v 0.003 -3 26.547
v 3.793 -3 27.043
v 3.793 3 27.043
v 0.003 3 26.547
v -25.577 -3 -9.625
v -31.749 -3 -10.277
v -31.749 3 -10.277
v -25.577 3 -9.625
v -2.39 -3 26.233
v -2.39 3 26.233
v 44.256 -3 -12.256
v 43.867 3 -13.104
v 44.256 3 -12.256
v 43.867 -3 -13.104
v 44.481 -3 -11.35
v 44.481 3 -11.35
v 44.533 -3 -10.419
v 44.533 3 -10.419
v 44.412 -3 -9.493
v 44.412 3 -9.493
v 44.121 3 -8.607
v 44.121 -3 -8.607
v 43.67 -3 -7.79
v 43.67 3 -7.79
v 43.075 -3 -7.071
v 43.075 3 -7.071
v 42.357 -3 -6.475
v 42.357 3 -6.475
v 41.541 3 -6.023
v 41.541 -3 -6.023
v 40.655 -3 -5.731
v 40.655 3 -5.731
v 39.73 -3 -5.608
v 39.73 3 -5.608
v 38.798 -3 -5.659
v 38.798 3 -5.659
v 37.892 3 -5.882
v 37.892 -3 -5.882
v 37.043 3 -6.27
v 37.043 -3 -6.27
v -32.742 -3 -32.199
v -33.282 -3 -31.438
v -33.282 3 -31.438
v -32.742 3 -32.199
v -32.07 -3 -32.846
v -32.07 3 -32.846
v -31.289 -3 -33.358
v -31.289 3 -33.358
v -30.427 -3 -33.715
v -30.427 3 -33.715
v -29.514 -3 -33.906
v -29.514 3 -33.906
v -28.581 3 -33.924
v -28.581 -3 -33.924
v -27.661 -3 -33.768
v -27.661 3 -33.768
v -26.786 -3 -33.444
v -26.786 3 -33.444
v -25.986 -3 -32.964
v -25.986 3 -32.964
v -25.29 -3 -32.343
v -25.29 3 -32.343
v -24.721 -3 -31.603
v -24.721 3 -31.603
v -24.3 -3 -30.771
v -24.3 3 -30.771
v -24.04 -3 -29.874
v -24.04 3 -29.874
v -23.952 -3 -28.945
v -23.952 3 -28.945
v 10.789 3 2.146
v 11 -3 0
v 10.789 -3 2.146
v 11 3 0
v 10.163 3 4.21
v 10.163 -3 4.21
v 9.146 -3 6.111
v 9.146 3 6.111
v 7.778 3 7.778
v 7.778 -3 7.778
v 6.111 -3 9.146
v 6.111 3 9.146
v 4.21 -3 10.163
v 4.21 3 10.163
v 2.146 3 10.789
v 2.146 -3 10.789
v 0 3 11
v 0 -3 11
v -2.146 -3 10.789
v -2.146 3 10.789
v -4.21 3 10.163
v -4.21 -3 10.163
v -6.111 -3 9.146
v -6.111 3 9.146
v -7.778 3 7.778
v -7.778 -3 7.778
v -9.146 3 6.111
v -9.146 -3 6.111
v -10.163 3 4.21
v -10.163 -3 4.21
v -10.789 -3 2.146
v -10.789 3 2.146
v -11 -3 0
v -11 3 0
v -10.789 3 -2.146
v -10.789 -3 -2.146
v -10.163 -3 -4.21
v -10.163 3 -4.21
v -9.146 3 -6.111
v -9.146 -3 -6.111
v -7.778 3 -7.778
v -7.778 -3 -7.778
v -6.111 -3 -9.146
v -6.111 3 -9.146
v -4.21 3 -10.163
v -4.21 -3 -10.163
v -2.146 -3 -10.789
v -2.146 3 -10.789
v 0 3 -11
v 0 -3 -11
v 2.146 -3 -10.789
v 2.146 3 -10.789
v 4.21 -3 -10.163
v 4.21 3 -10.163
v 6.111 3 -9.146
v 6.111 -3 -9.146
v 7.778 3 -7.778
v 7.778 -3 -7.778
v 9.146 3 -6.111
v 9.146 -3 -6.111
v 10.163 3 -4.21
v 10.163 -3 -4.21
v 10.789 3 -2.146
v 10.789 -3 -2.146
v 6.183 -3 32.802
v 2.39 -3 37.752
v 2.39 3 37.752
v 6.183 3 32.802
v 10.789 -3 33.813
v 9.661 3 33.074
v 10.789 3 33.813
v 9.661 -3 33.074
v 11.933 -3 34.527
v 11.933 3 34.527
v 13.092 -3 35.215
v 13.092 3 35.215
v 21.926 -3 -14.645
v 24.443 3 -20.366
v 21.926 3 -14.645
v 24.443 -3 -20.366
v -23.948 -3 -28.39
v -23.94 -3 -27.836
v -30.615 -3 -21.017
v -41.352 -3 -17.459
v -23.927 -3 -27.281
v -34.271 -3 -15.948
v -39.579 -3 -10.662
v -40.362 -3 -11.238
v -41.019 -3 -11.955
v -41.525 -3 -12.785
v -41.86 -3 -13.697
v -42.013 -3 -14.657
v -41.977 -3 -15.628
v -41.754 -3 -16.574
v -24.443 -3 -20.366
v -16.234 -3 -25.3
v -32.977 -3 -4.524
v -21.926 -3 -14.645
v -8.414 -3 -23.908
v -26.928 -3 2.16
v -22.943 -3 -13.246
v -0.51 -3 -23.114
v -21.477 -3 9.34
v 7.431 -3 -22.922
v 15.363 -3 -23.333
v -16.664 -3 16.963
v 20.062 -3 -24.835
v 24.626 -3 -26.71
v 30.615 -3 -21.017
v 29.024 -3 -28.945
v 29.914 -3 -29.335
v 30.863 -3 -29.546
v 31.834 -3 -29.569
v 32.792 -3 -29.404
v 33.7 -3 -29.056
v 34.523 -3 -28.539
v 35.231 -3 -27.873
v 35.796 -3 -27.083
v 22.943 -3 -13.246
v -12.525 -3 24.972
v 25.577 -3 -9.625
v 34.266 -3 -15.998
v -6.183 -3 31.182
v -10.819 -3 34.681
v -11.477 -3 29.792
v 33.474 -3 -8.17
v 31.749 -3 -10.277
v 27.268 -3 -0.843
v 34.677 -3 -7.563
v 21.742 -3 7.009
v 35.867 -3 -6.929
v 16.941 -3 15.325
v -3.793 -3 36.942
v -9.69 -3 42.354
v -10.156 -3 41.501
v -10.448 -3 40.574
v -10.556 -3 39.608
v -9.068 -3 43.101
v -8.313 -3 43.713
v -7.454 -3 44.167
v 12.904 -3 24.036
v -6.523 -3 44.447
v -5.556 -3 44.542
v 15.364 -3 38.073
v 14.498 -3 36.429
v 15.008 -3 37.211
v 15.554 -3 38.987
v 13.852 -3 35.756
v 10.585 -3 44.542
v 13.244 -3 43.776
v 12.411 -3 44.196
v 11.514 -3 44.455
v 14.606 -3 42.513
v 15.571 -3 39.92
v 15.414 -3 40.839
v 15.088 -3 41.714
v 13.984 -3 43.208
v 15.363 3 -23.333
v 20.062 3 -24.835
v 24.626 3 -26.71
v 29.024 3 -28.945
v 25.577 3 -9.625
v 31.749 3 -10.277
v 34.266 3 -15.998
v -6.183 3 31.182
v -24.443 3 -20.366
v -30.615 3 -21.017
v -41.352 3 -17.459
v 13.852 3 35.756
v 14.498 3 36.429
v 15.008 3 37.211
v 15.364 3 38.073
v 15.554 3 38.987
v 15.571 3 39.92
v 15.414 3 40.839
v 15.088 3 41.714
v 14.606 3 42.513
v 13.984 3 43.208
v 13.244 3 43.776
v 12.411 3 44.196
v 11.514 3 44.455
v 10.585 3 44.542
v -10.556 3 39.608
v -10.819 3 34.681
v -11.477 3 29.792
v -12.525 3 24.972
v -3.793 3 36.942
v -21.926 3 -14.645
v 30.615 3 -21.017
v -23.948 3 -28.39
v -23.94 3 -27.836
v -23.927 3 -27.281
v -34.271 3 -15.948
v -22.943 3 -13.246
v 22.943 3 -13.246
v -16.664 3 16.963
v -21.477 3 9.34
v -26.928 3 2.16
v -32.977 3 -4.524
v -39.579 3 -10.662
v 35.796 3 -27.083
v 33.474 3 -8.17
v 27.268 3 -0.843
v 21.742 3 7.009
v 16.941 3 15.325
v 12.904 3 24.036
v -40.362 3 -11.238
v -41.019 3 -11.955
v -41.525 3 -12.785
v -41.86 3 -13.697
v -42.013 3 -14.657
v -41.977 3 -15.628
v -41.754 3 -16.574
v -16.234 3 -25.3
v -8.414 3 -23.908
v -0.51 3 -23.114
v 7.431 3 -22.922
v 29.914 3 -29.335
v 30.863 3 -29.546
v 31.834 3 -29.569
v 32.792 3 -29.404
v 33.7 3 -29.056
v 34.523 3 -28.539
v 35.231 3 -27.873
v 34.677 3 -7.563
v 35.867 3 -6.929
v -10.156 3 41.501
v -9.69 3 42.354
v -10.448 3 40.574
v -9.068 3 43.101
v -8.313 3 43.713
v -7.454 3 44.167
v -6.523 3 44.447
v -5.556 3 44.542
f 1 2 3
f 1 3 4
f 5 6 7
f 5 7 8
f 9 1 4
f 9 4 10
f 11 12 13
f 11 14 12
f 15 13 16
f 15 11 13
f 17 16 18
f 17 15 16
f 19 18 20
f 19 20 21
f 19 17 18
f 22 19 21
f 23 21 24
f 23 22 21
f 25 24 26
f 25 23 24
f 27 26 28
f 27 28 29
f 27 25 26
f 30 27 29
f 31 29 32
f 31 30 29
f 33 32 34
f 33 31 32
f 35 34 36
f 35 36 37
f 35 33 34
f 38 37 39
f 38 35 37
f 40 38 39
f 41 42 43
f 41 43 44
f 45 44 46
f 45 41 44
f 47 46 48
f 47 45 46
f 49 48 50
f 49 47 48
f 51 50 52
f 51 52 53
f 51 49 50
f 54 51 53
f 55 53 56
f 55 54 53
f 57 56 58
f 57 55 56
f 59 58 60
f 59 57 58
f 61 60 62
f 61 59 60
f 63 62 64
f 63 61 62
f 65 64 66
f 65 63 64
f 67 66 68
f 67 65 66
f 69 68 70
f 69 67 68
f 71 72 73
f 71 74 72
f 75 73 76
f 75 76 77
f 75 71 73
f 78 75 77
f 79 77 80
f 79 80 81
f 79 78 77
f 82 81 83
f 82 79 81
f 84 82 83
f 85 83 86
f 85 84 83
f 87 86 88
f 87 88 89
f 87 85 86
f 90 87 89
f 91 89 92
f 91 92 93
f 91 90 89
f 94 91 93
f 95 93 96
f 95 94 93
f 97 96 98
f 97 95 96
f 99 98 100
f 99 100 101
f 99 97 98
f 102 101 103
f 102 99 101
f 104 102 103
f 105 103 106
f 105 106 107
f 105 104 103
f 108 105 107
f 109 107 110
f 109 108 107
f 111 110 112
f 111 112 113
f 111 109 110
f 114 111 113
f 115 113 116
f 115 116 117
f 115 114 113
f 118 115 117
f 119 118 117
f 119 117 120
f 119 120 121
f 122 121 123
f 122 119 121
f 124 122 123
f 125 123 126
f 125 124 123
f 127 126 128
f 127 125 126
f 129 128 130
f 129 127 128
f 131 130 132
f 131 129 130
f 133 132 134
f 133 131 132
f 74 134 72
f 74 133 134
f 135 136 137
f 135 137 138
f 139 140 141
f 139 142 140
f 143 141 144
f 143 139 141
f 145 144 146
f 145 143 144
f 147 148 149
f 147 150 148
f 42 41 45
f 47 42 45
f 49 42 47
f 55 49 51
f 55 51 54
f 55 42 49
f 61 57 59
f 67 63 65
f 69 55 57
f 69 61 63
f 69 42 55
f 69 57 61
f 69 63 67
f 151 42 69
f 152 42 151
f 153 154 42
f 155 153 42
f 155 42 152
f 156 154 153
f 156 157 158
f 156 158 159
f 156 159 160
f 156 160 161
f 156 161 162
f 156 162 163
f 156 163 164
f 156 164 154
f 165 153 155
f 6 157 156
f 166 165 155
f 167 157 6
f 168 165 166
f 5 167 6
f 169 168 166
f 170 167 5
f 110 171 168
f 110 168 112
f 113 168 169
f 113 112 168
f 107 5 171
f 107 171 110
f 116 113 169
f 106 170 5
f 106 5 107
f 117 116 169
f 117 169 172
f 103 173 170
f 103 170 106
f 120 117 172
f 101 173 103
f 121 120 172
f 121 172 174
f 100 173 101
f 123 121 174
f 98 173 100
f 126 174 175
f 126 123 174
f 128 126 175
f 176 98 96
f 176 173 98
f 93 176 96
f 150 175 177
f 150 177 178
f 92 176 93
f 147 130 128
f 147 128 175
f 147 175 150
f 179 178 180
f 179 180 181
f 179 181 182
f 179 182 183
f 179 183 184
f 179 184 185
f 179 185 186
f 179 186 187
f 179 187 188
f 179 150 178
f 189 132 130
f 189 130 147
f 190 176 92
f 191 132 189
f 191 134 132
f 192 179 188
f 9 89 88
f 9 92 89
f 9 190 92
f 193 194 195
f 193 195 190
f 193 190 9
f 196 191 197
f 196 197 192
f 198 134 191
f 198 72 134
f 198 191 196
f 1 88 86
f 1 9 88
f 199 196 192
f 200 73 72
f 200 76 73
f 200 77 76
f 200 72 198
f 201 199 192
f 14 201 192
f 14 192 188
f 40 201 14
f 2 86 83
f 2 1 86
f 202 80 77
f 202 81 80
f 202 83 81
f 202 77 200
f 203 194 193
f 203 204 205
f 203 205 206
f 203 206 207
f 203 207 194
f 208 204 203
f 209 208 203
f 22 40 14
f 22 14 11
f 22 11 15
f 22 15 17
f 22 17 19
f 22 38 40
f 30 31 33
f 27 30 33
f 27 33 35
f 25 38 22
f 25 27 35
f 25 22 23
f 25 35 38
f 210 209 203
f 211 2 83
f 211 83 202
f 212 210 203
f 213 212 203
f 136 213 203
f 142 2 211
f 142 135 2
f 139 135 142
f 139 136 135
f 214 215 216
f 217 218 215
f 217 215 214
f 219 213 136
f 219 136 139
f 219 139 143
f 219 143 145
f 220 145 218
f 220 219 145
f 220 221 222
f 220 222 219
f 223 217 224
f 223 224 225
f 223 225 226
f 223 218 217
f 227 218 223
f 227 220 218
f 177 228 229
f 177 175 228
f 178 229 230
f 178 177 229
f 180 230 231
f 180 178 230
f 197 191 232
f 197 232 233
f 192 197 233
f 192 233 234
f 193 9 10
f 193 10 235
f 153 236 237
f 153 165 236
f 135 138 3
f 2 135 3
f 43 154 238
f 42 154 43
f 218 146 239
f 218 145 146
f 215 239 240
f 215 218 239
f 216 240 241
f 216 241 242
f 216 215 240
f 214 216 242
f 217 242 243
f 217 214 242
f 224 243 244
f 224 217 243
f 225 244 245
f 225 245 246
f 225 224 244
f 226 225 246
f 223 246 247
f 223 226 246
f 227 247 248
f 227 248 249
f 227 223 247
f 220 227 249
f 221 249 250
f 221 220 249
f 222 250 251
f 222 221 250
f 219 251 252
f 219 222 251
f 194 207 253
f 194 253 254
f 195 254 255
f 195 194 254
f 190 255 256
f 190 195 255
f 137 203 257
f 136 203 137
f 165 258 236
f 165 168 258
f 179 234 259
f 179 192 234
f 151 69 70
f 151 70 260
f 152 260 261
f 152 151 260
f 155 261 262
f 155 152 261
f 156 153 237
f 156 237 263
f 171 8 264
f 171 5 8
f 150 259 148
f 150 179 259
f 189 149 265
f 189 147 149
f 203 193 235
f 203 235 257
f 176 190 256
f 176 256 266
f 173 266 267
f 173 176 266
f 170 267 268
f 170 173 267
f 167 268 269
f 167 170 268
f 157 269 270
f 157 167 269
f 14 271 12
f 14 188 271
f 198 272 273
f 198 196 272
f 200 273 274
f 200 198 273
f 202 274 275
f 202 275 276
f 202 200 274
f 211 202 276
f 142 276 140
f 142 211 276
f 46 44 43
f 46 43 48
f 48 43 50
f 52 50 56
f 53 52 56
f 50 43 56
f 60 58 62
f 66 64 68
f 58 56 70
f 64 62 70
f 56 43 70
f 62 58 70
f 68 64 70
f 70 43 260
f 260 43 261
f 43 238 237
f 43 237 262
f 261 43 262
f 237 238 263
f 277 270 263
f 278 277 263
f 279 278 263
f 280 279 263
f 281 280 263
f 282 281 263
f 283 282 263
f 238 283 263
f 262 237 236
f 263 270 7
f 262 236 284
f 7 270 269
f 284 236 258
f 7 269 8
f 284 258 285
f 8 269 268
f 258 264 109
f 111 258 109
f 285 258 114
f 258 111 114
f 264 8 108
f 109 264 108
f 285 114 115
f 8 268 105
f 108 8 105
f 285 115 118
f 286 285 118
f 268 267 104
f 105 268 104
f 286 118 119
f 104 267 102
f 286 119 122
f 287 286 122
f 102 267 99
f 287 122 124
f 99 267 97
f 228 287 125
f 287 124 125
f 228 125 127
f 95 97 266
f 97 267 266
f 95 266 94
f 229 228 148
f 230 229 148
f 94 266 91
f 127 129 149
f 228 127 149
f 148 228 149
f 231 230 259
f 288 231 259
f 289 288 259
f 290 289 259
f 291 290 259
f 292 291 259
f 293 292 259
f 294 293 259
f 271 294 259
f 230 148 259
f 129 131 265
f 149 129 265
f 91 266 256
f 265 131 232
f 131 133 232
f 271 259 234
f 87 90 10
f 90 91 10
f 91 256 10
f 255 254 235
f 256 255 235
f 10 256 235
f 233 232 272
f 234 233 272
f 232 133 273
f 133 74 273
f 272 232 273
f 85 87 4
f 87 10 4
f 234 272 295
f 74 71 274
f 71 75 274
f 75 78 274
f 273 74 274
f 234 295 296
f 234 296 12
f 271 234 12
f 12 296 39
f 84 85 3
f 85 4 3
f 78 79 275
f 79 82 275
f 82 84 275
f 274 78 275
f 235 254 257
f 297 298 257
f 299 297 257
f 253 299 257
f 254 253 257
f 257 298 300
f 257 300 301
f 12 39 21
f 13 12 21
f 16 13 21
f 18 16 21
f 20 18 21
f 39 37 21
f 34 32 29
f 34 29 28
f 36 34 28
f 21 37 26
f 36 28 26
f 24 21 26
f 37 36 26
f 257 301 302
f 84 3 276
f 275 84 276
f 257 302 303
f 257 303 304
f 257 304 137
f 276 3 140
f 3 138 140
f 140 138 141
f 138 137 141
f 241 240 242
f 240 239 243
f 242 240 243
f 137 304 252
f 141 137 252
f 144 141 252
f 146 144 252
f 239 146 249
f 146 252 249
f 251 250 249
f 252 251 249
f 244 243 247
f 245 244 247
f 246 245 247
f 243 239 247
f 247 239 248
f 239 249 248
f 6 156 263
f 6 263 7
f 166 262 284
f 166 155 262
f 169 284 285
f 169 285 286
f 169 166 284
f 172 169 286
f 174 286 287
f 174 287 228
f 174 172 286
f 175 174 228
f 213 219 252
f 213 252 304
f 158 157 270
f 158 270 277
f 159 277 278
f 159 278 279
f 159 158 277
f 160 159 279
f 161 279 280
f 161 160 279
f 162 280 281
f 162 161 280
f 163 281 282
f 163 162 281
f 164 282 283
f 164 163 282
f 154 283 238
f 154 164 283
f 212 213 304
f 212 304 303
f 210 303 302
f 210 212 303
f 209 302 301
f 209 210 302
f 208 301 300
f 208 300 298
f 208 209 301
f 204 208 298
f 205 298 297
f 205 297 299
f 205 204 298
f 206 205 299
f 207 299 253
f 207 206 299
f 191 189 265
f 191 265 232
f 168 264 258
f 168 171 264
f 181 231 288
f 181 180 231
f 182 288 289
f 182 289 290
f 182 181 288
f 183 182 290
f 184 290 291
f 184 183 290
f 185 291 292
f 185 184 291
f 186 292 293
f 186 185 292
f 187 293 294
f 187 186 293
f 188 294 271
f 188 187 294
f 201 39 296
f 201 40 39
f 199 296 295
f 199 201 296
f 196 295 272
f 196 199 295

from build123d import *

# Parameters (mm, degrees)
F0_R     = 11
F1_DEPTH = 3


with BuildPart() as f1:
    # F0 (on Front) → F1 (new body, symmetric)
    with BuildSketch(Plane.XZ):
        with BuildLine():
            ThreePointArc((13.091594, 35.215377), (15.413694, 40.839465), (10.585045, 44.541717))
            Line((10.585045, 44.541717), (-5.556075, 44.541717))
            ThreePointArc((-5.556075, 44.541717), (-9.068174, 43.100531), (-10.555639, 39.607781))
            ThreePointArc((-10.555639, 39.607781), (-11.098737, 32.23023), (-12.52502, 24.971516))
            ThreePointArc((-12.52502, 24.971516), (-24.124845, 5.691327), (-39.579164, -10.662439))
            ThreePointArc((-39.579164, -10.662439), (-41.860242, -13.696996), (-41.352296, -17.459156))
            Line((-41.352296, -17.459156), (-33.281736, -31.437776))
            ThreePointArc((-33.281736, -31.437776), (-27.661168, -33.768383), (-23.951614, -28.945342))
            ThreePointArc((-23.951614, -28.945342), (-23.944714, -28.112998), (-23.926531, -27.280824))
            ThreePointArc((-23.926531, -27.280824), (-4.469508, -23.436159), (15.363457, -23.332743))
            ThreePointArc((15.363457, -23.332743), (22.362829, -25.726903), (29.023525, -28.945342))
            ThreePointArc((29.023525, -28.945342), (32.792068, -29.403535), (35.79622, -27.082561))
            Line((35.79622, -27.082561), (43.86678, -13.10394))
            ThreePointArc((43.86678, -13.10394), (43.074861, -7.071082), (37.043208, -6.270036))
            ThreePointArc((37.043208, -6.270036), (35.274041, -7.249485), (33.473584, -8.170152))
            ThreePointArc((33.473584, -8.170152), (19.248618, 11.113195), (9.661233, 33.07405))
            ThreePointArc((9.661233, 33.07405), (11.358782, 34.172958), (13.091594, 35.215377))
        make_face()
        Polygon((-30.615118, -21.017243), (-34.27078, -15.948025), (-31.748977, -10.276928), (-25.576762, -9.625325), (-22.943373, -13.246362), (-21.926349, -14.64482), (-24.442903, -20.36564), align=None, mode=Mode.SUBTRACT)
        Circle(F0_R, mode=Mode.SUBTRACT)
        Polygon((22.943373, -13.246362), (25.576762, -9.625325), (31.748977, -10.276928), (34.265531, -15.997749), (30.615118, -21.017243), (24.442903, -20.36564), (21.926349, -14.64482), align=None, mode=Mode.SUBTRACT)
        Polygon((6.182559, 32.802254), (3.792685, 27.043044), (0.003247, 26.546629), (-2.389875, 26.233131), (-6.182559, 31.182428), (-3.792685, 36.941638), (2.389875, 37.751551), align=None, mode=Mode.SUBTRACT)
    extrude(amount=F1_DEPTH, both=True)


solid = f1.part
